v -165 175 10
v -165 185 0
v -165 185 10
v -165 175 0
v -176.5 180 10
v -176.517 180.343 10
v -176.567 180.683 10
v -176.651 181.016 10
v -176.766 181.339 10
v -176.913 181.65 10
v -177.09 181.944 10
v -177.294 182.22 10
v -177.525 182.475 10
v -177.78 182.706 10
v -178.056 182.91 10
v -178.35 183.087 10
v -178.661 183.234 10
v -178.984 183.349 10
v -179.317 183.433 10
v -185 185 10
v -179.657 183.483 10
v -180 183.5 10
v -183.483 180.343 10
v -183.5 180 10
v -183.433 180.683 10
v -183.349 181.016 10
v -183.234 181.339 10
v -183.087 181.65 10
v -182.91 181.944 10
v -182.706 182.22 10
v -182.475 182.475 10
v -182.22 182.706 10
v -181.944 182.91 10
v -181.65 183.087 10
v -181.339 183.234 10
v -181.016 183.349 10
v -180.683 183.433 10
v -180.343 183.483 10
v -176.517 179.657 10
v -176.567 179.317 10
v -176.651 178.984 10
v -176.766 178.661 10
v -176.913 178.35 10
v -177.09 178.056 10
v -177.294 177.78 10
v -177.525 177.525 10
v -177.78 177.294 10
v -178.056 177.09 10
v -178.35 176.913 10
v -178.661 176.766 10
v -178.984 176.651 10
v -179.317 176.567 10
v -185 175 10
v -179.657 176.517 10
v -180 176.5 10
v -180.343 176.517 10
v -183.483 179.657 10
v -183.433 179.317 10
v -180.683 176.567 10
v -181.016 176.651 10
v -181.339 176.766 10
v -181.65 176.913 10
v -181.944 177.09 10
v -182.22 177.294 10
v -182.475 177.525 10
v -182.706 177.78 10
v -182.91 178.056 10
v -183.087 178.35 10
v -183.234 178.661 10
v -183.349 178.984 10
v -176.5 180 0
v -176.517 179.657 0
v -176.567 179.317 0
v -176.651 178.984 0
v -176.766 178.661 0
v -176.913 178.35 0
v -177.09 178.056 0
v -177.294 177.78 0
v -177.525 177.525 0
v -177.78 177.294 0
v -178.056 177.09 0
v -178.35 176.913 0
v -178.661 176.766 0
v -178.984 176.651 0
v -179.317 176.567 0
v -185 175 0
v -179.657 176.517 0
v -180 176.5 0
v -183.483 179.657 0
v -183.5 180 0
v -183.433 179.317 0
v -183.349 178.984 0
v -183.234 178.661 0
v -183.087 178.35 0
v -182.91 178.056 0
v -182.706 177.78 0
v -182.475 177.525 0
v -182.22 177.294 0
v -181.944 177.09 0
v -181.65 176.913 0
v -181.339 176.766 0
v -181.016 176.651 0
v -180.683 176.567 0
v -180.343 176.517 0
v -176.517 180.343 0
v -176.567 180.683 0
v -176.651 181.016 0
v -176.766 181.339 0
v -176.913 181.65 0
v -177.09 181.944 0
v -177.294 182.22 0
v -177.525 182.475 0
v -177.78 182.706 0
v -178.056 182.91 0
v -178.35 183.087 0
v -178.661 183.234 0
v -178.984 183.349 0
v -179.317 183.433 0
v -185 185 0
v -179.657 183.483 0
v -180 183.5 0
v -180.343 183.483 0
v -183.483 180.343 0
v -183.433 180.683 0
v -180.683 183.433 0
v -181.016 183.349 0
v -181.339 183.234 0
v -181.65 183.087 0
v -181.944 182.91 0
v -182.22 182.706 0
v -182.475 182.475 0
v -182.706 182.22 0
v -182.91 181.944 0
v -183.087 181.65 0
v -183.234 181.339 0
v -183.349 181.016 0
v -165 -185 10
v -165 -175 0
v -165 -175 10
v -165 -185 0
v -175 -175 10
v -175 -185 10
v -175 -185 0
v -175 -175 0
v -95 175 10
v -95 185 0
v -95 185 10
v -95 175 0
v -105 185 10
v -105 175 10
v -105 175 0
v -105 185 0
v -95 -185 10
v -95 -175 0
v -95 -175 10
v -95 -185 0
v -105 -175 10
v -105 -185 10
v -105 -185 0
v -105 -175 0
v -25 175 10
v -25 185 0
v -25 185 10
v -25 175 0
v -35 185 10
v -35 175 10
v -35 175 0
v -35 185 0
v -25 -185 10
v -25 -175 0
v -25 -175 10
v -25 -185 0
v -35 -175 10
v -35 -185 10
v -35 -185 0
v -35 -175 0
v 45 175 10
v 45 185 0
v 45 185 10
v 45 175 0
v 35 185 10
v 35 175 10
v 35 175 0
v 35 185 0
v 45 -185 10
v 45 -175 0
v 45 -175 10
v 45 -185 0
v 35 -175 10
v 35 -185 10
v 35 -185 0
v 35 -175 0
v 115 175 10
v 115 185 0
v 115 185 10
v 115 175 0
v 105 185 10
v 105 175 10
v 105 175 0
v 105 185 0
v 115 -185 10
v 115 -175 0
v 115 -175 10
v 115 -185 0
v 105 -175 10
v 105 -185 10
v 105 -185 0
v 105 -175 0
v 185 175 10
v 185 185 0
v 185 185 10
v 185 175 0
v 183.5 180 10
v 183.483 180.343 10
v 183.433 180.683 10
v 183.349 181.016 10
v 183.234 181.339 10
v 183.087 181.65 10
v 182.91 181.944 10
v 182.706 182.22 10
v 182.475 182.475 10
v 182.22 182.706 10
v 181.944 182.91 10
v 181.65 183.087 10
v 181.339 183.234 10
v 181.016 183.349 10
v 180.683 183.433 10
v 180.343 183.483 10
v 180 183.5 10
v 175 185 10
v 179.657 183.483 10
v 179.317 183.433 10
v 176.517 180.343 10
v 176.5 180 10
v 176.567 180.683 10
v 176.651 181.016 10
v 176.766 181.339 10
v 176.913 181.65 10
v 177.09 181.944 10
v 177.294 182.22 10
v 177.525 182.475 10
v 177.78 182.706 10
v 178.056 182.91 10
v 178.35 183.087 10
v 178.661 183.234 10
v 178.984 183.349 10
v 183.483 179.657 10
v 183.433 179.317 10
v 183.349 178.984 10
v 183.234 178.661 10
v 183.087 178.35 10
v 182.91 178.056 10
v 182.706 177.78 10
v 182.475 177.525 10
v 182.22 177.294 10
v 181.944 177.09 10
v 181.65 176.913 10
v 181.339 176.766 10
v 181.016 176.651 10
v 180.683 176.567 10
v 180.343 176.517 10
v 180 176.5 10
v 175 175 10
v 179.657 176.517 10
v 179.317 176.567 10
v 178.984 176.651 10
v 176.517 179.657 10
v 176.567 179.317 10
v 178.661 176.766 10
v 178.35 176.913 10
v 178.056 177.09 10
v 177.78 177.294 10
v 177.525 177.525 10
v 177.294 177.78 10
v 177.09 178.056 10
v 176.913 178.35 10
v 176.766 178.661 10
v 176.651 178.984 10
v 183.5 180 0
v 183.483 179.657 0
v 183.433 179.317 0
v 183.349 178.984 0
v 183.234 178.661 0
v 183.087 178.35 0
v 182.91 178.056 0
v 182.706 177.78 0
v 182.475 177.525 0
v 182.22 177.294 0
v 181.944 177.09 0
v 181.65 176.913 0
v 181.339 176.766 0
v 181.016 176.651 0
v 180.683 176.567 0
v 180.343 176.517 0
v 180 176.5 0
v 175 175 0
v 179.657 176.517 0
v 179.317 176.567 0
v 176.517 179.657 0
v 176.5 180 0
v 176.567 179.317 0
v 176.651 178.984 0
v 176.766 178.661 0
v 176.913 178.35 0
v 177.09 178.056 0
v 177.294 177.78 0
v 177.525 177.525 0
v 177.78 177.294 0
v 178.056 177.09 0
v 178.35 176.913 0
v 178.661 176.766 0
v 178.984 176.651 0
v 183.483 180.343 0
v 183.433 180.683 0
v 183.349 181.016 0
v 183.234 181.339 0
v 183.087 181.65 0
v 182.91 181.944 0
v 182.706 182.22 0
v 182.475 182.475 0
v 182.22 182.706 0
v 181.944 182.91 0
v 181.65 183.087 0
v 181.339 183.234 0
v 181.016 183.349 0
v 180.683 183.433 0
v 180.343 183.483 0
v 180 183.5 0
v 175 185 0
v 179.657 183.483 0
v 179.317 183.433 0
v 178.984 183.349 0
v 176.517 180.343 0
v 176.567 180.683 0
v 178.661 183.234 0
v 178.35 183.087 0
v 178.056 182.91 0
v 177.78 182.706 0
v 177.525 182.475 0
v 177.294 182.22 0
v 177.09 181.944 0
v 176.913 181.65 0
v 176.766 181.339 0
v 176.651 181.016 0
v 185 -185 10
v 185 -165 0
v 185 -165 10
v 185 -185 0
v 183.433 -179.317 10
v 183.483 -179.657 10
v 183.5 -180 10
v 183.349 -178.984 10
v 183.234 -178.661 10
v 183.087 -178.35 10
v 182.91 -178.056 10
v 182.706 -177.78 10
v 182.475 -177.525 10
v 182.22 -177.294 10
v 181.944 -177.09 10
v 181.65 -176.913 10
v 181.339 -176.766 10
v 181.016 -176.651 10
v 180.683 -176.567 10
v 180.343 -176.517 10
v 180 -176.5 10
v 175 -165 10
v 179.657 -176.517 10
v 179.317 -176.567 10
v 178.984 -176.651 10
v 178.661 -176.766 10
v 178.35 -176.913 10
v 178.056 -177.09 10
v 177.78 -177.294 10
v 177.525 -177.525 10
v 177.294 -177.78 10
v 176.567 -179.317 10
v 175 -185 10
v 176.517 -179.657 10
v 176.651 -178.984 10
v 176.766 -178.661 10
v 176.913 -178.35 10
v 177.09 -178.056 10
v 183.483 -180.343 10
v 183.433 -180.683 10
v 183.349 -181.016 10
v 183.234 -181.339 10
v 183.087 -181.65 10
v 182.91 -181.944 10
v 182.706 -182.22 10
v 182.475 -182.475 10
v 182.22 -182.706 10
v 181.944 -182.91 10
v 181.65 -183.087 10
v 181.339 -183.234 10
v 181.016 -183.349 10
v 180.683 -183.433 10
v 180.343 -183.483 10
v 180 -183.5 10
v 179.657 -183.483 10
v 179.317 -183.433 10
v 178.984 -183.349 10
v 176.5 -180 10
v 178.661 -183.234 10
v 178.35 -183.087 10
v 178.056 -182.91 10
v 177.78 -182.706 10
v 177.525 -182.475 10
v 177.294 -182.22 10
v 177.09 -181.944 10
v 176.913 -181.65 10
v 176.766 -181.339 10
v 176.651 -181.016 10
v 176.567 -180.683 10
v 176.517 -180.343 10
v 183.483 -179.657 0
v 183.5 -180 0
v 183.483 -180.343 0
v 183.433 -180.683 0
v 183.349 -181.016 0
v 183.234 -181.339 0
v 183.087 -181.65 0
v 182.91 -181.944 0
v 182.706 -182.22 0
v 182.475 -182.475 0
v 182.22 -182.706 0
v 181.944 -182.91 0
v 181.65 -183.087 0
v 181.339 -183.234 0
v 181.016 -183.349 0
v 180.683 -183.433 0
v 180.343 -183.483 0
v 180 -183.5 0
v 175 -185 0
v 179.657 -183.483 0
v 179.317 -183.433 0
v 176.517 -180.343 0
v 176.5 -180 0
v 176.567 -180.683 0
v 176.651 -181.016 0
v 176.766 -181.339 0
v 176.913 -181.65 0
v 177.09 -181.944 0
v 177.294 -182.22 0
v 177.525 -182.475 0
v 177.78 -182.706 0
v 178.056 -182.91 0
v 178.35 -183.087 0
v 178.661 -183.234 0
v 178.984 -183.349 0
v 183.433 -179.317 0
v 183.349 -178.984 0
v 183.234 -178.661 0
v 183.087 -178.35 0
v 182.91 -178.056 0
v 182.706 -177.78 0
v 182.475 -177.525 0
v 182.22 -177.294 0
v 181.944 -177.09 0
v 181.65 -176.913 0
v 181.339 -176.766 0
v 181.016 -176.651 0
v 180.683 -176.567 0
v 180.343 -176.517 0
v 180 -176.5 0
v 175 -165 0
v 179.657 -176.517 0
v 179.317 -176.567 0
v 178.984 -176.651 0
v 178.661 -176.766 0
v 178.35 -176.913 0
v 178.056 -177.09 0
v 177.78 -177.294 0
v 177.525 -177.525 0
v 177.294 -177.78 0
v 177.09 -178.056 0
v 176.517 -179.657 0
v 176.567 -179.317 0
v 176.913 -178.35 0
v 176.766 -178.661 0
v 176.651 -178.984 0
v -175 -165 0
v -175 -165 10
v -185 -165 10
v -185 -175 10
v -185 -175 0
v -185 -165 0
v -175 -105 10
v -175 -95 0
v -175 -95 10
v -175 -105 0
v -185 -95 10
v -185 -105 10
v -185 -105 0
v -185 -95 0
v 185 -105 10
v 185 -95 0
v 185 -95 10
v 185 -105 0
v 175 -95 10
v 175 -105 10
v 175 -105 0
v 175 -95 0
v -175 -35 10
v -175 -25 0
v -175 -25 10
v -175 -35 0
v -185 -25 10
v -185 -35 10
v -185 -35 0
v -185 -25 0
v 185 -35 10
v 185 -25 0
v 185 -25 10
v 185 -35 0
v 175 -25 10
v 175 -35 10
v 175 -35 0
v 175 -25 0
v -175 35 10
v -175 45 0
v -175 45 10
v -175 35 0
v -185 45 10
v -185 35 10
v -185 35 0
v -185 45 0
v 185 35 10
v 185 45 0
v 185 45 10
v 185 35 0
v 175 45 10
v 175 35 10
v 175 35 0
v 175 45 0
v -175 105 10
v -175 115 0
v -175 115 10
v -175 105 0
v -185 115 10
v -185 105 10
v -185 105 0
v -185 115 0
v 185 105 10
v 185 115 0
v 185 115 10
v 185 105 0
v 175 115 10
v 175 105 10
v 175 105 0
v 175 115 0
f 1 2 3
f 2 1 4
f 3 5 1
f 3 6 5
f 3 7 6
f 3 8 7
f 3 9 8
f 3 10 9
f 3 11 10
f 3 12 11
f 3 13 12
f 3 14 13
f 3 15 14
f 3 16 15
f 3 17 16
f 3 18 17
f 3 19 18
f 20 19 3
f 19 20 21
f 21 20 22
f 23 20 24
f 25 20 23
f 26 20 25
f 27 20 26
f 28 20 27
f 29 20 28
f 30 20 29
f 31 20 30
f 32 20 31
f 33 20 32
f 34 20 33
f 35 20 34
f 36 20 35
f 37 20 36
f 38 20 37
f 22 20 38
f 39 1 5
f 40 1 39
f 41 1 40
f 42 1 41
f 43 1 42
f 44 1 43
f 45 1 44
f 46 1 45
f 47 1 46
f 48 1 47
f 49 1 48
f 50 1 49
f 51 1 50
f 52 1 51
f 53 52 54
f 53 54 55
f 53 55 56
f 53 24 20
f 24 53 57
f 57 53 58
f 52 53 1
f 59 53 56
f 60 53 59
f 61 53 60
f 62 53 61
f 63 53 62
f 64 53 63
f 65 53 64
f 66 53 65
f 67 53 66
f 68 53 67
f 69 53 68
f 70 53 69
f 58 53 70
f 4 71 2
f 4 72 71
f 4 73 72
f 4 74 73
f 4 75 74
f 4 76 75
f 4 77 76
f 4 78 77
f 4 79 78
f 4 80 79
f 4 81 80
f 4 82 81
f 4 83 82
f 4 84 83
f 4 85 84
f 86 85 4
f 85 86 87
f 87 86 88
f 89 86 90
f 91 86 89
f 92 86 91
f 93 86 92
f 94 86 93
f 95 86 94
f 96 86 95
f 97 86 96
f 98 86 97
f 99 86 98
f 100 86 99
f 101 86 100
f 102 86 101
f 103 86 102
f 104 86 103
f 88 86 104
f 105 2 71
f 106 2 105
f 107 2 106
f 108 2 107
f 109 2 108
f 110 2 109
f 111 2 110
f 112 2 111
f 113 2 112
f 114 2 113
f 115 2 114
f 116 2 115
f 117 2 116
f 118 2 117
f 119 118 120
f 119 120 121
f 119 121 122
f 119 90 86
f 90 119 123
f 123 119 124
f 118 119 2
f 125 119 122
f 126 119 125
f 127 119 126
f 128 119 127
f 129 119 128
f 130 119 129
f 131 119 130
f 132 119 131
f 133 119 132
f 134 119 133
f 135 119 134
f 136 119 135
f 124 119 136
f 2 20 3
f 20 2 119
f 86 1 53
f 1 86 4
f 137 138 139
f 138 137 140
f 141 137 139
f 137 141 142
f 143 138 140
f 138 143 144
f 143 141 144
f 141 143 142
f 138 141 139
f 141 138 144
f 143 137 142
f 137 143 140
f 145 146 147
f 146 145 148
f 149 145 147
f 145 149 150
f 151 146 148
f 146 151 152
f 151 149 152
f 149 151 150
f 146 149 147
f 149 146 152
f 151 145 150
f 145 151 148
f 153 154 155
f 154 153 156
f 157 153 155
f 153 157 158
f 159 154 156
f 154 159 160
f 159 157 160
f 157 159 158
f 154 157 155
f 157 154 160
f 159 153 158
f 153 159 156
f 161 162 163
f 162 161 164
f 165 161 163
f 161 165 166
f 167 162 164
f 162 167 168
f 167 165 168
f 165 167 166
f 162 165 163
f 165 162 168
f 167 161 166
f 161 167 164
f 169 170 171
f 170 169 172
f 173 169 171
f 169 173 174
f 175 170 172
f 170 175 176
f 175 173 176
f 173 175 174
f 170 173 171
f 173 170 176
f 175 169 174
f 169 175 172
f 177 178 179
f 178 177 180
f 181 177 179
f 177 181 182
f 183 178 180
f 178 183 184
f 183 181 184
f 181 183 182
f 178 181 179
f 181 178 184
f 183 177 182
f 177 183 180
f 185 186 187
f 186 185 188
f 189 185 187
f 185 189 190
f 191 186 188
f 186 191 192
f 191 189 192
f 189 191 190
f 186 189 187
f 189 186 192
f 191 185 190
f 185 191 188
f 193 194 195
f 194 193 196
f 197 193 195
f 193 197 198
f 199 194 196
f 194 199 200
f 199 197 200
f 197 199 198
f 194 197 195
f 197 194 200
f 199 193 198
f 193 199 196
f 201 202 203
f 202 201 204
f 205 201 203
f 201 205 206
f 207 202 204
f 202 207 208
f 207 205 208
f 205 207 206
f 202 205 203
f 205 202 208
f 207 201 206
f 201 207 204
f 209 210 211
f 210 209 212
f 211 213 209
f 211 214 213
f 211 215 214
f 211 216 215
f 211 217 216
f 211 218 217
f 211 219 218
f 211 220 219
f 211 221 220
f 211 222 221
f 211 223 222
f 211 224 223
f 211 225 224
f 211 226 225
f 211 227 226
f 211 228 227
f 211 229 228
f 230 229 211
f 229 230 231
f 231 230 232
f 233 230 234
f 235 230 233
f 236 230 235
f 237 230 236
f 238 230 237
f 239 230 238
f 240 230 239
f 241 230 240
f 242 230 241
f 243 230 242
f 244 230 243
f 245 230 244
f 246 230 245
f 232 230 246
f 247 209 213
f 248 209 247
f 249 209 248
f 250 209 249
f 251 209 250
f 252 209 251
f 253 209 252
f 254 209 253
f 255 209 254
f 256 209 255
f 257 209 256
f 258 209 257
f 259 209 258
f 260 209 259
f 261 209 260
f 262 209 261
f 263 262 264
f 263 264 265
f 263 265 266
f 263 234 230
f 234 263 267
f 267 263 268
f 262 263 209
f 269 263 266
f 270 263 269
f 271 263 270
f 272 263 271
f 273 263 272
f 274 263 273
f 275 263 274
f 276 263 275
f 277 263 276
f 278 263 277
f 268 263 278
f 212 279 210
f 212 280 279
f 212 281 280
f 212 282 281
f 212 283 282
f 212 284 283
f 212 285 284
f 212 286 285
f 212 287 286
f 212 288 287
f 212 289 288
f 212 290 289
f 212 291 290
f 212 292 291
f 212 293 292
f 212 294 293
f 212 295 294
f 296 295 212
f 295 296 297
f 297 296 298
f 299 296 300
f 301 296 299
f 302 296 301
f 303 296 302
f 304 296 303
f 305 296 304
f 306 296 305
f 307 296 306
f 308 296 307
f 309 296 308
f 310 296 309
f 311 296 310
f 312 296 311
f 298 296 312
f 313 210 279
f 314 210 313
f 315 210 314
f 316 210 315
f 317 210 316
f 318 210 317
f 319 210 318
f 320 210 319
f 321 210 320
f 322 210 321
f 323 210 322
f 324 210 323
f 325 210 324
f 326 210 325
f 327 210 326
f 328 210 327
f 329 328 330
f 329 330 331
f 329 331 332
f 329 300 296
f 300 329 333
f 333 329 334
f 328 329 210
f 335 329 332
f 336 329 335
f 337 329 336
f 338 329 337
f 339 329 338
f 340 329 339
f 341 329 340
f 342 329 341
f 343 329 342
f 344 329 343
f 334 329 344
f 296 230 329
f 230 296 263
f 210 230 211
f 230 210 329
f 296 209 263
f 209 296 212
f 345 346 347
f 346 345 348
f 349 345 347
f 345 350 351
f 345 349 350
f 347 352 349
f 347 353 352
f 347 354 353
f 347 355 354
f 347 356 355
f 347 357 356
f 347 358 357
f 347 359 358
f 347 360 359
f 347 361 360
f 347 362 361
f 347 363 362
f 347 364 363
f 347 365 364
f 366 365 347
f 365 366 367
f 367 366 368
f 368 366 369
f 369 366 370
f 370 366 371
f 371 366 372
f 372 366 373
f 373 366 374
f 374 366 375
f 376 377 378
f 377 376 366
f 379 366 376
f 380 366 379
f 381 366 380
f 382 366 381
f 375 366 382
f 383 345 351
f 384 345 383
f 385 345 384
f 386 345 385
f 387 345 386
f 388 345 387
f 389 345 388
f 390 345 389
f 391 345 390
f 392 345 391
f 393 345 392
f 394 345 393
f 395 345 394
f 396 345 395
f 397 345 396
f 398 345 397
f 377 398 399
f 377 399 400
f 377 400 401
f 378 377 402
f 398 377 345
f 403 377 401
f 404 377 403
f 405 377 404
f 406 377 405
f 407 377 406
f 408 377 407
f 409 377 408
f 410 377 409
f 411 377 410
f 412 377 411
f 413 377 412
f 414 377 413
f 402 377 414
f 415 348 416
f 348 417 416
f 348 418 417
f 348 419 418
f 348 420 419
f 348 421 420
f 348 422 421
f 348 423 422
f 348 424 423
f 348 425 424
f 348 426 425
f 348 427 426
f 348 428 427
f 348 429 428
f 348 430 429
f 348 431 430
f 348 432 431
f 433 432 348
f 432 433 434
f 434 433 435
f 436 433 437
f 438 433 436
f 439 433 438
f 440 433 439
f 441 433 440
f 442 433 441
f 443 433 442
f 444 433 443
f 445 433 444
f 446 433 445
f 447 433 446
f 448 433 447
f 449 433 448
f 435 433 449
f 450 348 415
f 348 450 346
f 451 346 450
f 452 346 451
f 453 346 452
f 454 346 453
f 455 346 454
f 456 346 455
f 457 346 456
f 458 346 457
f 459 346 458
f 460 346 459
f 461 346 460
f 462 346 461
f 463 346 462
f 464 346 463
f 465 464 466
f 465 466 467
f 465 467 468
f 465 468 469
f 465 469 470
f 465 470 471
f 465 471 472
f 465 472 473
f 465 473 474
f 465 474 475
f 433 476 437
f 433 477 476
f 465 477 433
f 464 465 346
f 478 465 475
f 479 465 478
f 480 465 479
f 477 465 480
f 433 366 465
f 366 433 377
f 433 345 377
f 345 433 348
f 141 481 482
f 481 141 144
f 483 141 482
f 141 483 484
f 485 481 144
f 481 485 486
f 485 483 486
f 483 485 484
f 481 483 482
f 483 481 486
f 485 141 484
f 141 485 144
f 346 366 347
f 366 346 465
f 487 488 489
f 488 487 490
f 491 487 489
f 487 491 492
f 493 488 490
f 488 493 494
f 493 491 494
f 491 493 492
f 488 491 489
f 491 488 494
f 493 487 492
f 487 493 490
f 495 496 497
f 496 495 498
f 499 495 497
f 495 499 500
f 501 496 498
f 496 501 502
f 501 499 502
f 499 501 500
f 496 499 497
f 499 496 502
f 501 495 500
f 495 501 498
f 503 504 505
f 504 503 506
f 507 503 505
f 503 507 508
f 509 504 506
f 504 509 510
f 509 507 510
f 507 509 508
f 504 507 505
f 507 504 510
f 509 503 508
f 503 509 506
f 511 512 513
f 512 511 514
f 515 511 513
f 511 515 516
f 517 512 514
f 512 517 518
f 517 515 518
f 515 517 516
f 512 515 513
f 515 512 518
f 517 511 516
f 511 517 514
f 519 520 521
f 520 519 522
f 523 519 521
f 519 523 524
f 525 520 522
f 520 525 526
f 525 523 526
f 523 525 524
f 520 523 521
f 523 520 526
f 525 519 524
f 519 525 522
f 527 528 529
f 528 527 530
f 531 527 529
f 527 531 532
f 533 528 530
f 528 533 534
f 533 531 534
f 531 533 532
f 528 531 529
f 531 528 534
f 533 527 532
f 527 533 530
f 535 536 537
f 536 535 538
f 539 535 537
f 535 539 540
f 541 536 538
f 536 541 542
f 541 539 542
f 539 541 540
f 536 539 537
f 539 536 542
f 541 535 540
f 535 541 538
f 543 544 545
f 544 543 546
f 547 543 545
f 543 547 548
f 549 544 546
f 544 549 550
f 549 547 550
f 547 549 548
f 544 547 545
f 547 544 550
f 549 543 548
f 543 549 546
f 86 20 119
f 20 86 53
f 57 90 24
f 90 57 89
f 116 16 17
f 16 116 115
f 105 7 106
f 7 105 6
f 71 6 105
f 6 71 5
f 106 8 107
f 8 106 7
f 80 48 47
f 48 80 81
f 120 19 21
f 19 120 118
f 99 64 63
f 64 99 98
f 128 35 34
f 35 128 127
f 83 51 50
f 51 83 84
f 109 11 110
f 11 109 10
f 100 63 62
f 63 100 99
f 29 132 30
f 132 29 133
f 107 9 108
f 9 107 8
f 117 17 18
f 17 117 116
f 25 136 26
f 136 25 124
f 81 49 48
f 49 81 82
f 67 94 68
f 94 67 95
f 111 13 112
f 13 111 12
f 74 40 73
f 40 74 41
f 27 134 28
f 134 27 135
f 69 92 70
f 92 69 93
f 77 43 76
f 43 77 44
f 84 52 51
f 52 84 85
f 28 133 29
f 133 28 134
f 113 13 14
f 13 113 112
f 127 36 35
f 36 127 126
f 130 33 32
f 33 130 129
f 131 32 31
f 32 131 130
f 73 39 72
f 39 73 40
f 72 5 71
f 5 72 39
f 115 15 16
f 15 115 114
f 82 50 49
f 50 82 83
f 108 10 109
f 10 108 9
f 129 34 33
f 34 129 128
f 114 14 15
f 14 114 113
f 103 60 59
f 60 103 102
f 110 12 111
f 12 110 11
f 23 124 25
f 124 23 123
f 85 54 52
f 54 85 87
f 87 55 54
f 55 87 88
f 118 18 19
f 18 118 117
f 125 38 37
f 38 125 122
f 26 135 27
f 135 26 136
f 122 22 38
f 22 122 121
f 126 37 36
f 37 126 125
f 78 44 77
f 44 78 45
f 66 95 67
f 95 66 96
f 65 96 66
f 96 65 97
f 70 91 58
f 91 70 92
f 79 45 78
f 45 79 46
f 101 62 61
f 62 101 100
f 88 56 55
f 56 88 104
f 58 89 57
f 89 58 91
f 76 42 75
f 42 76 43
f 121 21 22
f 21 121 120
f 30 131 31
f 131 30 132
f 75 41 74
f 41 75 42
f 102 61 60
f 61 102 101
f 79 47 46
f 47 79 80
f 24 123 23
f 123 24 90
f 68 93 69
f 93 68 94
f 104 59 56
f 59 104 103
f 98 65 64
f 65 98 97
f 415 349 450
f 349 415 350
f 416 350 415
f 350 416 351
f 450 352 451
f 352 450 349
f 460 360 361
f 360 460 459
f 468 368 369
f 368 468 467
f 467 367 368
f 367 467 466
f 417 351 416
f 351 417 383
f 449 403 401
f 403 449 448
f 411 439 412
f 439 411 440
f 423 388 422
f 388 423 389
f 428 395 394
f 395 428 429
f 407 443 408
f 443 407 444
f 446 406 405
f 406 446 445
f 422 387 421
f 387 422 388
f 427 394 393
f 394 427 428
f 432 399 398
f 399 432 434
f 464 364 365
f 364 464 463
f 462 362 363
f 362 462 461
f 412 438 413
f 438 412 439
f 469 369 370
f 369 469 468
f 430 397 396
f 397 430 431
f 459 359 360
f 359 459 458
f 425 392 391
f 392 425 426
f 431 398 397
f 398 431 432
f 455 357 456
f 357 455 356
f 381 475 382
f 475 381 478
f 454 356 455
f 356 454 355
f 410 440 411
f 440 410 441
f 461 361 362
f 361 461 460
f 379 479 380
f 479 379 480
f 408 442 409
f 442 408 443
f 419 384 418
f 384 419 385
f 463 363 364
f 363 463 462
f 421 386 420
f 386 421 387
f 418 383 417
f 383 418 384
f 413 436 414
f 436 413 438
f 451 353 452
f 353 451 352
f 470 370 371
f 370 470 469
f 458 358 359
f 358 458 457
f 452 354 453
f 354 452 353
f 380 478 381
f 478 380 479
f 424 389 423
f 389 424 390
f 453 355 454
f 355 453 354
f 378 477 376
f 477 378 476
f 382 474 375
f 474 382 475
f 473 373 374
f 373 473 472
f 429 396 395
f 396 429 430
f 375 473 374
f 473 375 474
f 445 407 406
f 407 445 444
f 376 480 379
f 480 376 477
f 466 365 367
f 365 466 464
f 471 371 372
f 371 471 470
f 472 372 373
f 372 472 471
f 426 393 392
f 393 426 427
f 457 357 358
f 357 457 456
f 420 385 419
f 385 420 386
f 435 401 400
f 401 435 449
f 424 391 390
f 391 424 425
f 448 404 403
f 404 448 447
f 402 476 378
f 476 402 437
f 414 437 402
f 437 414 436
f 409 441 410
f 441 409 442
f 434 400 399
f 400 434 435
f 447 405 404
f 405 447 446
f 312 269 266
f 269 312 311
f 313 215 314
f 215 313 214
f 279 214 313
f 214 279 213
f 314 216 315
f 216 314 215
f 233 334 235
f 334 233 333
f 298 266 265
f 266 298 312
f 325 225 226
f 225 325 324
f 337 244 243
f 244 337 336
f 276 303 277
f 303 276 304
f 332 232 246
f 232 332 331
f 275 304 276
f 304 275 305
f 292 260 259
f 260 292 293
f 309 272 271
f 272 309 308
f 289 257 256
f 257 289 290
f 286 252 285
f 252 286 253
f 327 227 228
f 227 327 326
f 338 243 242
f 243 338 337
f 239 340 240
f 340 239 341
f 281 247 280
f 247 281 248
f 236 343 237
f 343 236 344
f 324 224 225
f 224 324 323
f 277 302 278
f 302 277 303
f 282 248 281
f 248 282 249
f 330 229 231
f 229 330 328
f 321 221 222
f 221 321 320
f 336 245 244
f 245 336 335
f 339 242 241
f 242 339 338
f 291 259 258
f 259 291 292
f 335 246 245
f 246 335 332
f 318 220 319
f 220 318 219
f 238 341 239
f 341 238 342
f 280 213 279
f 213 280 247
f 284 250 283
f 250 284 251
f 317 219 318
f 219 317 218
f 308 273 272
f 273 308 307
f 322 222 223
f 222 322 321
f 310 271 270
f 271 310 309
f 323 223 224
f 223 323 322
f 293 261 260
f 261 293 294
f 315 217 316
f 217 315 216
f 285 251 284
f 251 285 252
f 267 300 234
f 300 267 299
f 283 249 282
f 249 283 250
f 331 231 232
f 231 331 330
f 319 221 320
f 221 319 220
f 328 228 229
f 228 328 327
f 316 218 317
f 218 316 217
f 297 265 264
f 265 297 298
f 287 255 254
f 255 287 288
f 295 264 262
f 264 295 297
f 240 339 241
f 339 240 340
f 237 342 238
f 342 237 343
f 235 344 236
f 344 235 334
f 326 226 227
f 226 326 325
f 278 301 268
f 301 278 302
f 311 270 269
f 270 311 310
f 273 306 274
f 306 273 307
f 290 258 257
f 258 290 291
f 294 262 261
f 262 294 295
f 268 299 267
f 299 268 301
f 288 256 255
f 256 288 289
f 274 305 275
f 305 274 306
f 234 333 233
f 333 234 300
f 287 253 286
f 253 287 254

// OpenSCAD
// ring_52.scad - ring index 52 (z bottom = 520 mm)
$fn = 64; bar = 10; half_b = bar/2; outer = 370; half_outer = outer/2;
front_y = 180; back_y = -180; left_x = -180; right_x = 180;
x_centers = [-170, -100, -30, 40, 110, 180];
z_centers = [5, 85, 155, 225, 295, 365, 435, 505, 575, 645, 715]; ring_z = 520;
module place_box(cx, cy, sx, sy) { translate([cx - sx/2, cy - sy/2, 0]) cube([sx, sy, bar]); }

difference() { union() {
    for (x = x_centers) { place_box(x, front_y, bar, bar); place_box(x, back_y, bar, bar); }
    for (y = x_centers) { place_box(left_x, y, bar, bar); place_box(right_x, y, bar, bar); }
    for (zc = z_centers) if ((zc - half_b < ring_z + bar) && (zc + half_b > ring_z)) {
        translate([-half_outer, front_y - half_b, 0]) cube([outer, bar, bar]);
        translate([-half_outer, back_y - half_b, 0])  cube([outer, bar, bar]);
        translate([left_x - half_b, -half_outer, 0])  cube([bar, outer, bar]);
        translate([right_x - half_b, -half_outer, 0]) cube([bar, outer, bar]);
    }
  }
  for (cx = [-180, 180]) for (cy = [-180, 180]) translate([cx, cy, 0]) cylinder(h = bar, r = 3.5, $fn = 64);
}
